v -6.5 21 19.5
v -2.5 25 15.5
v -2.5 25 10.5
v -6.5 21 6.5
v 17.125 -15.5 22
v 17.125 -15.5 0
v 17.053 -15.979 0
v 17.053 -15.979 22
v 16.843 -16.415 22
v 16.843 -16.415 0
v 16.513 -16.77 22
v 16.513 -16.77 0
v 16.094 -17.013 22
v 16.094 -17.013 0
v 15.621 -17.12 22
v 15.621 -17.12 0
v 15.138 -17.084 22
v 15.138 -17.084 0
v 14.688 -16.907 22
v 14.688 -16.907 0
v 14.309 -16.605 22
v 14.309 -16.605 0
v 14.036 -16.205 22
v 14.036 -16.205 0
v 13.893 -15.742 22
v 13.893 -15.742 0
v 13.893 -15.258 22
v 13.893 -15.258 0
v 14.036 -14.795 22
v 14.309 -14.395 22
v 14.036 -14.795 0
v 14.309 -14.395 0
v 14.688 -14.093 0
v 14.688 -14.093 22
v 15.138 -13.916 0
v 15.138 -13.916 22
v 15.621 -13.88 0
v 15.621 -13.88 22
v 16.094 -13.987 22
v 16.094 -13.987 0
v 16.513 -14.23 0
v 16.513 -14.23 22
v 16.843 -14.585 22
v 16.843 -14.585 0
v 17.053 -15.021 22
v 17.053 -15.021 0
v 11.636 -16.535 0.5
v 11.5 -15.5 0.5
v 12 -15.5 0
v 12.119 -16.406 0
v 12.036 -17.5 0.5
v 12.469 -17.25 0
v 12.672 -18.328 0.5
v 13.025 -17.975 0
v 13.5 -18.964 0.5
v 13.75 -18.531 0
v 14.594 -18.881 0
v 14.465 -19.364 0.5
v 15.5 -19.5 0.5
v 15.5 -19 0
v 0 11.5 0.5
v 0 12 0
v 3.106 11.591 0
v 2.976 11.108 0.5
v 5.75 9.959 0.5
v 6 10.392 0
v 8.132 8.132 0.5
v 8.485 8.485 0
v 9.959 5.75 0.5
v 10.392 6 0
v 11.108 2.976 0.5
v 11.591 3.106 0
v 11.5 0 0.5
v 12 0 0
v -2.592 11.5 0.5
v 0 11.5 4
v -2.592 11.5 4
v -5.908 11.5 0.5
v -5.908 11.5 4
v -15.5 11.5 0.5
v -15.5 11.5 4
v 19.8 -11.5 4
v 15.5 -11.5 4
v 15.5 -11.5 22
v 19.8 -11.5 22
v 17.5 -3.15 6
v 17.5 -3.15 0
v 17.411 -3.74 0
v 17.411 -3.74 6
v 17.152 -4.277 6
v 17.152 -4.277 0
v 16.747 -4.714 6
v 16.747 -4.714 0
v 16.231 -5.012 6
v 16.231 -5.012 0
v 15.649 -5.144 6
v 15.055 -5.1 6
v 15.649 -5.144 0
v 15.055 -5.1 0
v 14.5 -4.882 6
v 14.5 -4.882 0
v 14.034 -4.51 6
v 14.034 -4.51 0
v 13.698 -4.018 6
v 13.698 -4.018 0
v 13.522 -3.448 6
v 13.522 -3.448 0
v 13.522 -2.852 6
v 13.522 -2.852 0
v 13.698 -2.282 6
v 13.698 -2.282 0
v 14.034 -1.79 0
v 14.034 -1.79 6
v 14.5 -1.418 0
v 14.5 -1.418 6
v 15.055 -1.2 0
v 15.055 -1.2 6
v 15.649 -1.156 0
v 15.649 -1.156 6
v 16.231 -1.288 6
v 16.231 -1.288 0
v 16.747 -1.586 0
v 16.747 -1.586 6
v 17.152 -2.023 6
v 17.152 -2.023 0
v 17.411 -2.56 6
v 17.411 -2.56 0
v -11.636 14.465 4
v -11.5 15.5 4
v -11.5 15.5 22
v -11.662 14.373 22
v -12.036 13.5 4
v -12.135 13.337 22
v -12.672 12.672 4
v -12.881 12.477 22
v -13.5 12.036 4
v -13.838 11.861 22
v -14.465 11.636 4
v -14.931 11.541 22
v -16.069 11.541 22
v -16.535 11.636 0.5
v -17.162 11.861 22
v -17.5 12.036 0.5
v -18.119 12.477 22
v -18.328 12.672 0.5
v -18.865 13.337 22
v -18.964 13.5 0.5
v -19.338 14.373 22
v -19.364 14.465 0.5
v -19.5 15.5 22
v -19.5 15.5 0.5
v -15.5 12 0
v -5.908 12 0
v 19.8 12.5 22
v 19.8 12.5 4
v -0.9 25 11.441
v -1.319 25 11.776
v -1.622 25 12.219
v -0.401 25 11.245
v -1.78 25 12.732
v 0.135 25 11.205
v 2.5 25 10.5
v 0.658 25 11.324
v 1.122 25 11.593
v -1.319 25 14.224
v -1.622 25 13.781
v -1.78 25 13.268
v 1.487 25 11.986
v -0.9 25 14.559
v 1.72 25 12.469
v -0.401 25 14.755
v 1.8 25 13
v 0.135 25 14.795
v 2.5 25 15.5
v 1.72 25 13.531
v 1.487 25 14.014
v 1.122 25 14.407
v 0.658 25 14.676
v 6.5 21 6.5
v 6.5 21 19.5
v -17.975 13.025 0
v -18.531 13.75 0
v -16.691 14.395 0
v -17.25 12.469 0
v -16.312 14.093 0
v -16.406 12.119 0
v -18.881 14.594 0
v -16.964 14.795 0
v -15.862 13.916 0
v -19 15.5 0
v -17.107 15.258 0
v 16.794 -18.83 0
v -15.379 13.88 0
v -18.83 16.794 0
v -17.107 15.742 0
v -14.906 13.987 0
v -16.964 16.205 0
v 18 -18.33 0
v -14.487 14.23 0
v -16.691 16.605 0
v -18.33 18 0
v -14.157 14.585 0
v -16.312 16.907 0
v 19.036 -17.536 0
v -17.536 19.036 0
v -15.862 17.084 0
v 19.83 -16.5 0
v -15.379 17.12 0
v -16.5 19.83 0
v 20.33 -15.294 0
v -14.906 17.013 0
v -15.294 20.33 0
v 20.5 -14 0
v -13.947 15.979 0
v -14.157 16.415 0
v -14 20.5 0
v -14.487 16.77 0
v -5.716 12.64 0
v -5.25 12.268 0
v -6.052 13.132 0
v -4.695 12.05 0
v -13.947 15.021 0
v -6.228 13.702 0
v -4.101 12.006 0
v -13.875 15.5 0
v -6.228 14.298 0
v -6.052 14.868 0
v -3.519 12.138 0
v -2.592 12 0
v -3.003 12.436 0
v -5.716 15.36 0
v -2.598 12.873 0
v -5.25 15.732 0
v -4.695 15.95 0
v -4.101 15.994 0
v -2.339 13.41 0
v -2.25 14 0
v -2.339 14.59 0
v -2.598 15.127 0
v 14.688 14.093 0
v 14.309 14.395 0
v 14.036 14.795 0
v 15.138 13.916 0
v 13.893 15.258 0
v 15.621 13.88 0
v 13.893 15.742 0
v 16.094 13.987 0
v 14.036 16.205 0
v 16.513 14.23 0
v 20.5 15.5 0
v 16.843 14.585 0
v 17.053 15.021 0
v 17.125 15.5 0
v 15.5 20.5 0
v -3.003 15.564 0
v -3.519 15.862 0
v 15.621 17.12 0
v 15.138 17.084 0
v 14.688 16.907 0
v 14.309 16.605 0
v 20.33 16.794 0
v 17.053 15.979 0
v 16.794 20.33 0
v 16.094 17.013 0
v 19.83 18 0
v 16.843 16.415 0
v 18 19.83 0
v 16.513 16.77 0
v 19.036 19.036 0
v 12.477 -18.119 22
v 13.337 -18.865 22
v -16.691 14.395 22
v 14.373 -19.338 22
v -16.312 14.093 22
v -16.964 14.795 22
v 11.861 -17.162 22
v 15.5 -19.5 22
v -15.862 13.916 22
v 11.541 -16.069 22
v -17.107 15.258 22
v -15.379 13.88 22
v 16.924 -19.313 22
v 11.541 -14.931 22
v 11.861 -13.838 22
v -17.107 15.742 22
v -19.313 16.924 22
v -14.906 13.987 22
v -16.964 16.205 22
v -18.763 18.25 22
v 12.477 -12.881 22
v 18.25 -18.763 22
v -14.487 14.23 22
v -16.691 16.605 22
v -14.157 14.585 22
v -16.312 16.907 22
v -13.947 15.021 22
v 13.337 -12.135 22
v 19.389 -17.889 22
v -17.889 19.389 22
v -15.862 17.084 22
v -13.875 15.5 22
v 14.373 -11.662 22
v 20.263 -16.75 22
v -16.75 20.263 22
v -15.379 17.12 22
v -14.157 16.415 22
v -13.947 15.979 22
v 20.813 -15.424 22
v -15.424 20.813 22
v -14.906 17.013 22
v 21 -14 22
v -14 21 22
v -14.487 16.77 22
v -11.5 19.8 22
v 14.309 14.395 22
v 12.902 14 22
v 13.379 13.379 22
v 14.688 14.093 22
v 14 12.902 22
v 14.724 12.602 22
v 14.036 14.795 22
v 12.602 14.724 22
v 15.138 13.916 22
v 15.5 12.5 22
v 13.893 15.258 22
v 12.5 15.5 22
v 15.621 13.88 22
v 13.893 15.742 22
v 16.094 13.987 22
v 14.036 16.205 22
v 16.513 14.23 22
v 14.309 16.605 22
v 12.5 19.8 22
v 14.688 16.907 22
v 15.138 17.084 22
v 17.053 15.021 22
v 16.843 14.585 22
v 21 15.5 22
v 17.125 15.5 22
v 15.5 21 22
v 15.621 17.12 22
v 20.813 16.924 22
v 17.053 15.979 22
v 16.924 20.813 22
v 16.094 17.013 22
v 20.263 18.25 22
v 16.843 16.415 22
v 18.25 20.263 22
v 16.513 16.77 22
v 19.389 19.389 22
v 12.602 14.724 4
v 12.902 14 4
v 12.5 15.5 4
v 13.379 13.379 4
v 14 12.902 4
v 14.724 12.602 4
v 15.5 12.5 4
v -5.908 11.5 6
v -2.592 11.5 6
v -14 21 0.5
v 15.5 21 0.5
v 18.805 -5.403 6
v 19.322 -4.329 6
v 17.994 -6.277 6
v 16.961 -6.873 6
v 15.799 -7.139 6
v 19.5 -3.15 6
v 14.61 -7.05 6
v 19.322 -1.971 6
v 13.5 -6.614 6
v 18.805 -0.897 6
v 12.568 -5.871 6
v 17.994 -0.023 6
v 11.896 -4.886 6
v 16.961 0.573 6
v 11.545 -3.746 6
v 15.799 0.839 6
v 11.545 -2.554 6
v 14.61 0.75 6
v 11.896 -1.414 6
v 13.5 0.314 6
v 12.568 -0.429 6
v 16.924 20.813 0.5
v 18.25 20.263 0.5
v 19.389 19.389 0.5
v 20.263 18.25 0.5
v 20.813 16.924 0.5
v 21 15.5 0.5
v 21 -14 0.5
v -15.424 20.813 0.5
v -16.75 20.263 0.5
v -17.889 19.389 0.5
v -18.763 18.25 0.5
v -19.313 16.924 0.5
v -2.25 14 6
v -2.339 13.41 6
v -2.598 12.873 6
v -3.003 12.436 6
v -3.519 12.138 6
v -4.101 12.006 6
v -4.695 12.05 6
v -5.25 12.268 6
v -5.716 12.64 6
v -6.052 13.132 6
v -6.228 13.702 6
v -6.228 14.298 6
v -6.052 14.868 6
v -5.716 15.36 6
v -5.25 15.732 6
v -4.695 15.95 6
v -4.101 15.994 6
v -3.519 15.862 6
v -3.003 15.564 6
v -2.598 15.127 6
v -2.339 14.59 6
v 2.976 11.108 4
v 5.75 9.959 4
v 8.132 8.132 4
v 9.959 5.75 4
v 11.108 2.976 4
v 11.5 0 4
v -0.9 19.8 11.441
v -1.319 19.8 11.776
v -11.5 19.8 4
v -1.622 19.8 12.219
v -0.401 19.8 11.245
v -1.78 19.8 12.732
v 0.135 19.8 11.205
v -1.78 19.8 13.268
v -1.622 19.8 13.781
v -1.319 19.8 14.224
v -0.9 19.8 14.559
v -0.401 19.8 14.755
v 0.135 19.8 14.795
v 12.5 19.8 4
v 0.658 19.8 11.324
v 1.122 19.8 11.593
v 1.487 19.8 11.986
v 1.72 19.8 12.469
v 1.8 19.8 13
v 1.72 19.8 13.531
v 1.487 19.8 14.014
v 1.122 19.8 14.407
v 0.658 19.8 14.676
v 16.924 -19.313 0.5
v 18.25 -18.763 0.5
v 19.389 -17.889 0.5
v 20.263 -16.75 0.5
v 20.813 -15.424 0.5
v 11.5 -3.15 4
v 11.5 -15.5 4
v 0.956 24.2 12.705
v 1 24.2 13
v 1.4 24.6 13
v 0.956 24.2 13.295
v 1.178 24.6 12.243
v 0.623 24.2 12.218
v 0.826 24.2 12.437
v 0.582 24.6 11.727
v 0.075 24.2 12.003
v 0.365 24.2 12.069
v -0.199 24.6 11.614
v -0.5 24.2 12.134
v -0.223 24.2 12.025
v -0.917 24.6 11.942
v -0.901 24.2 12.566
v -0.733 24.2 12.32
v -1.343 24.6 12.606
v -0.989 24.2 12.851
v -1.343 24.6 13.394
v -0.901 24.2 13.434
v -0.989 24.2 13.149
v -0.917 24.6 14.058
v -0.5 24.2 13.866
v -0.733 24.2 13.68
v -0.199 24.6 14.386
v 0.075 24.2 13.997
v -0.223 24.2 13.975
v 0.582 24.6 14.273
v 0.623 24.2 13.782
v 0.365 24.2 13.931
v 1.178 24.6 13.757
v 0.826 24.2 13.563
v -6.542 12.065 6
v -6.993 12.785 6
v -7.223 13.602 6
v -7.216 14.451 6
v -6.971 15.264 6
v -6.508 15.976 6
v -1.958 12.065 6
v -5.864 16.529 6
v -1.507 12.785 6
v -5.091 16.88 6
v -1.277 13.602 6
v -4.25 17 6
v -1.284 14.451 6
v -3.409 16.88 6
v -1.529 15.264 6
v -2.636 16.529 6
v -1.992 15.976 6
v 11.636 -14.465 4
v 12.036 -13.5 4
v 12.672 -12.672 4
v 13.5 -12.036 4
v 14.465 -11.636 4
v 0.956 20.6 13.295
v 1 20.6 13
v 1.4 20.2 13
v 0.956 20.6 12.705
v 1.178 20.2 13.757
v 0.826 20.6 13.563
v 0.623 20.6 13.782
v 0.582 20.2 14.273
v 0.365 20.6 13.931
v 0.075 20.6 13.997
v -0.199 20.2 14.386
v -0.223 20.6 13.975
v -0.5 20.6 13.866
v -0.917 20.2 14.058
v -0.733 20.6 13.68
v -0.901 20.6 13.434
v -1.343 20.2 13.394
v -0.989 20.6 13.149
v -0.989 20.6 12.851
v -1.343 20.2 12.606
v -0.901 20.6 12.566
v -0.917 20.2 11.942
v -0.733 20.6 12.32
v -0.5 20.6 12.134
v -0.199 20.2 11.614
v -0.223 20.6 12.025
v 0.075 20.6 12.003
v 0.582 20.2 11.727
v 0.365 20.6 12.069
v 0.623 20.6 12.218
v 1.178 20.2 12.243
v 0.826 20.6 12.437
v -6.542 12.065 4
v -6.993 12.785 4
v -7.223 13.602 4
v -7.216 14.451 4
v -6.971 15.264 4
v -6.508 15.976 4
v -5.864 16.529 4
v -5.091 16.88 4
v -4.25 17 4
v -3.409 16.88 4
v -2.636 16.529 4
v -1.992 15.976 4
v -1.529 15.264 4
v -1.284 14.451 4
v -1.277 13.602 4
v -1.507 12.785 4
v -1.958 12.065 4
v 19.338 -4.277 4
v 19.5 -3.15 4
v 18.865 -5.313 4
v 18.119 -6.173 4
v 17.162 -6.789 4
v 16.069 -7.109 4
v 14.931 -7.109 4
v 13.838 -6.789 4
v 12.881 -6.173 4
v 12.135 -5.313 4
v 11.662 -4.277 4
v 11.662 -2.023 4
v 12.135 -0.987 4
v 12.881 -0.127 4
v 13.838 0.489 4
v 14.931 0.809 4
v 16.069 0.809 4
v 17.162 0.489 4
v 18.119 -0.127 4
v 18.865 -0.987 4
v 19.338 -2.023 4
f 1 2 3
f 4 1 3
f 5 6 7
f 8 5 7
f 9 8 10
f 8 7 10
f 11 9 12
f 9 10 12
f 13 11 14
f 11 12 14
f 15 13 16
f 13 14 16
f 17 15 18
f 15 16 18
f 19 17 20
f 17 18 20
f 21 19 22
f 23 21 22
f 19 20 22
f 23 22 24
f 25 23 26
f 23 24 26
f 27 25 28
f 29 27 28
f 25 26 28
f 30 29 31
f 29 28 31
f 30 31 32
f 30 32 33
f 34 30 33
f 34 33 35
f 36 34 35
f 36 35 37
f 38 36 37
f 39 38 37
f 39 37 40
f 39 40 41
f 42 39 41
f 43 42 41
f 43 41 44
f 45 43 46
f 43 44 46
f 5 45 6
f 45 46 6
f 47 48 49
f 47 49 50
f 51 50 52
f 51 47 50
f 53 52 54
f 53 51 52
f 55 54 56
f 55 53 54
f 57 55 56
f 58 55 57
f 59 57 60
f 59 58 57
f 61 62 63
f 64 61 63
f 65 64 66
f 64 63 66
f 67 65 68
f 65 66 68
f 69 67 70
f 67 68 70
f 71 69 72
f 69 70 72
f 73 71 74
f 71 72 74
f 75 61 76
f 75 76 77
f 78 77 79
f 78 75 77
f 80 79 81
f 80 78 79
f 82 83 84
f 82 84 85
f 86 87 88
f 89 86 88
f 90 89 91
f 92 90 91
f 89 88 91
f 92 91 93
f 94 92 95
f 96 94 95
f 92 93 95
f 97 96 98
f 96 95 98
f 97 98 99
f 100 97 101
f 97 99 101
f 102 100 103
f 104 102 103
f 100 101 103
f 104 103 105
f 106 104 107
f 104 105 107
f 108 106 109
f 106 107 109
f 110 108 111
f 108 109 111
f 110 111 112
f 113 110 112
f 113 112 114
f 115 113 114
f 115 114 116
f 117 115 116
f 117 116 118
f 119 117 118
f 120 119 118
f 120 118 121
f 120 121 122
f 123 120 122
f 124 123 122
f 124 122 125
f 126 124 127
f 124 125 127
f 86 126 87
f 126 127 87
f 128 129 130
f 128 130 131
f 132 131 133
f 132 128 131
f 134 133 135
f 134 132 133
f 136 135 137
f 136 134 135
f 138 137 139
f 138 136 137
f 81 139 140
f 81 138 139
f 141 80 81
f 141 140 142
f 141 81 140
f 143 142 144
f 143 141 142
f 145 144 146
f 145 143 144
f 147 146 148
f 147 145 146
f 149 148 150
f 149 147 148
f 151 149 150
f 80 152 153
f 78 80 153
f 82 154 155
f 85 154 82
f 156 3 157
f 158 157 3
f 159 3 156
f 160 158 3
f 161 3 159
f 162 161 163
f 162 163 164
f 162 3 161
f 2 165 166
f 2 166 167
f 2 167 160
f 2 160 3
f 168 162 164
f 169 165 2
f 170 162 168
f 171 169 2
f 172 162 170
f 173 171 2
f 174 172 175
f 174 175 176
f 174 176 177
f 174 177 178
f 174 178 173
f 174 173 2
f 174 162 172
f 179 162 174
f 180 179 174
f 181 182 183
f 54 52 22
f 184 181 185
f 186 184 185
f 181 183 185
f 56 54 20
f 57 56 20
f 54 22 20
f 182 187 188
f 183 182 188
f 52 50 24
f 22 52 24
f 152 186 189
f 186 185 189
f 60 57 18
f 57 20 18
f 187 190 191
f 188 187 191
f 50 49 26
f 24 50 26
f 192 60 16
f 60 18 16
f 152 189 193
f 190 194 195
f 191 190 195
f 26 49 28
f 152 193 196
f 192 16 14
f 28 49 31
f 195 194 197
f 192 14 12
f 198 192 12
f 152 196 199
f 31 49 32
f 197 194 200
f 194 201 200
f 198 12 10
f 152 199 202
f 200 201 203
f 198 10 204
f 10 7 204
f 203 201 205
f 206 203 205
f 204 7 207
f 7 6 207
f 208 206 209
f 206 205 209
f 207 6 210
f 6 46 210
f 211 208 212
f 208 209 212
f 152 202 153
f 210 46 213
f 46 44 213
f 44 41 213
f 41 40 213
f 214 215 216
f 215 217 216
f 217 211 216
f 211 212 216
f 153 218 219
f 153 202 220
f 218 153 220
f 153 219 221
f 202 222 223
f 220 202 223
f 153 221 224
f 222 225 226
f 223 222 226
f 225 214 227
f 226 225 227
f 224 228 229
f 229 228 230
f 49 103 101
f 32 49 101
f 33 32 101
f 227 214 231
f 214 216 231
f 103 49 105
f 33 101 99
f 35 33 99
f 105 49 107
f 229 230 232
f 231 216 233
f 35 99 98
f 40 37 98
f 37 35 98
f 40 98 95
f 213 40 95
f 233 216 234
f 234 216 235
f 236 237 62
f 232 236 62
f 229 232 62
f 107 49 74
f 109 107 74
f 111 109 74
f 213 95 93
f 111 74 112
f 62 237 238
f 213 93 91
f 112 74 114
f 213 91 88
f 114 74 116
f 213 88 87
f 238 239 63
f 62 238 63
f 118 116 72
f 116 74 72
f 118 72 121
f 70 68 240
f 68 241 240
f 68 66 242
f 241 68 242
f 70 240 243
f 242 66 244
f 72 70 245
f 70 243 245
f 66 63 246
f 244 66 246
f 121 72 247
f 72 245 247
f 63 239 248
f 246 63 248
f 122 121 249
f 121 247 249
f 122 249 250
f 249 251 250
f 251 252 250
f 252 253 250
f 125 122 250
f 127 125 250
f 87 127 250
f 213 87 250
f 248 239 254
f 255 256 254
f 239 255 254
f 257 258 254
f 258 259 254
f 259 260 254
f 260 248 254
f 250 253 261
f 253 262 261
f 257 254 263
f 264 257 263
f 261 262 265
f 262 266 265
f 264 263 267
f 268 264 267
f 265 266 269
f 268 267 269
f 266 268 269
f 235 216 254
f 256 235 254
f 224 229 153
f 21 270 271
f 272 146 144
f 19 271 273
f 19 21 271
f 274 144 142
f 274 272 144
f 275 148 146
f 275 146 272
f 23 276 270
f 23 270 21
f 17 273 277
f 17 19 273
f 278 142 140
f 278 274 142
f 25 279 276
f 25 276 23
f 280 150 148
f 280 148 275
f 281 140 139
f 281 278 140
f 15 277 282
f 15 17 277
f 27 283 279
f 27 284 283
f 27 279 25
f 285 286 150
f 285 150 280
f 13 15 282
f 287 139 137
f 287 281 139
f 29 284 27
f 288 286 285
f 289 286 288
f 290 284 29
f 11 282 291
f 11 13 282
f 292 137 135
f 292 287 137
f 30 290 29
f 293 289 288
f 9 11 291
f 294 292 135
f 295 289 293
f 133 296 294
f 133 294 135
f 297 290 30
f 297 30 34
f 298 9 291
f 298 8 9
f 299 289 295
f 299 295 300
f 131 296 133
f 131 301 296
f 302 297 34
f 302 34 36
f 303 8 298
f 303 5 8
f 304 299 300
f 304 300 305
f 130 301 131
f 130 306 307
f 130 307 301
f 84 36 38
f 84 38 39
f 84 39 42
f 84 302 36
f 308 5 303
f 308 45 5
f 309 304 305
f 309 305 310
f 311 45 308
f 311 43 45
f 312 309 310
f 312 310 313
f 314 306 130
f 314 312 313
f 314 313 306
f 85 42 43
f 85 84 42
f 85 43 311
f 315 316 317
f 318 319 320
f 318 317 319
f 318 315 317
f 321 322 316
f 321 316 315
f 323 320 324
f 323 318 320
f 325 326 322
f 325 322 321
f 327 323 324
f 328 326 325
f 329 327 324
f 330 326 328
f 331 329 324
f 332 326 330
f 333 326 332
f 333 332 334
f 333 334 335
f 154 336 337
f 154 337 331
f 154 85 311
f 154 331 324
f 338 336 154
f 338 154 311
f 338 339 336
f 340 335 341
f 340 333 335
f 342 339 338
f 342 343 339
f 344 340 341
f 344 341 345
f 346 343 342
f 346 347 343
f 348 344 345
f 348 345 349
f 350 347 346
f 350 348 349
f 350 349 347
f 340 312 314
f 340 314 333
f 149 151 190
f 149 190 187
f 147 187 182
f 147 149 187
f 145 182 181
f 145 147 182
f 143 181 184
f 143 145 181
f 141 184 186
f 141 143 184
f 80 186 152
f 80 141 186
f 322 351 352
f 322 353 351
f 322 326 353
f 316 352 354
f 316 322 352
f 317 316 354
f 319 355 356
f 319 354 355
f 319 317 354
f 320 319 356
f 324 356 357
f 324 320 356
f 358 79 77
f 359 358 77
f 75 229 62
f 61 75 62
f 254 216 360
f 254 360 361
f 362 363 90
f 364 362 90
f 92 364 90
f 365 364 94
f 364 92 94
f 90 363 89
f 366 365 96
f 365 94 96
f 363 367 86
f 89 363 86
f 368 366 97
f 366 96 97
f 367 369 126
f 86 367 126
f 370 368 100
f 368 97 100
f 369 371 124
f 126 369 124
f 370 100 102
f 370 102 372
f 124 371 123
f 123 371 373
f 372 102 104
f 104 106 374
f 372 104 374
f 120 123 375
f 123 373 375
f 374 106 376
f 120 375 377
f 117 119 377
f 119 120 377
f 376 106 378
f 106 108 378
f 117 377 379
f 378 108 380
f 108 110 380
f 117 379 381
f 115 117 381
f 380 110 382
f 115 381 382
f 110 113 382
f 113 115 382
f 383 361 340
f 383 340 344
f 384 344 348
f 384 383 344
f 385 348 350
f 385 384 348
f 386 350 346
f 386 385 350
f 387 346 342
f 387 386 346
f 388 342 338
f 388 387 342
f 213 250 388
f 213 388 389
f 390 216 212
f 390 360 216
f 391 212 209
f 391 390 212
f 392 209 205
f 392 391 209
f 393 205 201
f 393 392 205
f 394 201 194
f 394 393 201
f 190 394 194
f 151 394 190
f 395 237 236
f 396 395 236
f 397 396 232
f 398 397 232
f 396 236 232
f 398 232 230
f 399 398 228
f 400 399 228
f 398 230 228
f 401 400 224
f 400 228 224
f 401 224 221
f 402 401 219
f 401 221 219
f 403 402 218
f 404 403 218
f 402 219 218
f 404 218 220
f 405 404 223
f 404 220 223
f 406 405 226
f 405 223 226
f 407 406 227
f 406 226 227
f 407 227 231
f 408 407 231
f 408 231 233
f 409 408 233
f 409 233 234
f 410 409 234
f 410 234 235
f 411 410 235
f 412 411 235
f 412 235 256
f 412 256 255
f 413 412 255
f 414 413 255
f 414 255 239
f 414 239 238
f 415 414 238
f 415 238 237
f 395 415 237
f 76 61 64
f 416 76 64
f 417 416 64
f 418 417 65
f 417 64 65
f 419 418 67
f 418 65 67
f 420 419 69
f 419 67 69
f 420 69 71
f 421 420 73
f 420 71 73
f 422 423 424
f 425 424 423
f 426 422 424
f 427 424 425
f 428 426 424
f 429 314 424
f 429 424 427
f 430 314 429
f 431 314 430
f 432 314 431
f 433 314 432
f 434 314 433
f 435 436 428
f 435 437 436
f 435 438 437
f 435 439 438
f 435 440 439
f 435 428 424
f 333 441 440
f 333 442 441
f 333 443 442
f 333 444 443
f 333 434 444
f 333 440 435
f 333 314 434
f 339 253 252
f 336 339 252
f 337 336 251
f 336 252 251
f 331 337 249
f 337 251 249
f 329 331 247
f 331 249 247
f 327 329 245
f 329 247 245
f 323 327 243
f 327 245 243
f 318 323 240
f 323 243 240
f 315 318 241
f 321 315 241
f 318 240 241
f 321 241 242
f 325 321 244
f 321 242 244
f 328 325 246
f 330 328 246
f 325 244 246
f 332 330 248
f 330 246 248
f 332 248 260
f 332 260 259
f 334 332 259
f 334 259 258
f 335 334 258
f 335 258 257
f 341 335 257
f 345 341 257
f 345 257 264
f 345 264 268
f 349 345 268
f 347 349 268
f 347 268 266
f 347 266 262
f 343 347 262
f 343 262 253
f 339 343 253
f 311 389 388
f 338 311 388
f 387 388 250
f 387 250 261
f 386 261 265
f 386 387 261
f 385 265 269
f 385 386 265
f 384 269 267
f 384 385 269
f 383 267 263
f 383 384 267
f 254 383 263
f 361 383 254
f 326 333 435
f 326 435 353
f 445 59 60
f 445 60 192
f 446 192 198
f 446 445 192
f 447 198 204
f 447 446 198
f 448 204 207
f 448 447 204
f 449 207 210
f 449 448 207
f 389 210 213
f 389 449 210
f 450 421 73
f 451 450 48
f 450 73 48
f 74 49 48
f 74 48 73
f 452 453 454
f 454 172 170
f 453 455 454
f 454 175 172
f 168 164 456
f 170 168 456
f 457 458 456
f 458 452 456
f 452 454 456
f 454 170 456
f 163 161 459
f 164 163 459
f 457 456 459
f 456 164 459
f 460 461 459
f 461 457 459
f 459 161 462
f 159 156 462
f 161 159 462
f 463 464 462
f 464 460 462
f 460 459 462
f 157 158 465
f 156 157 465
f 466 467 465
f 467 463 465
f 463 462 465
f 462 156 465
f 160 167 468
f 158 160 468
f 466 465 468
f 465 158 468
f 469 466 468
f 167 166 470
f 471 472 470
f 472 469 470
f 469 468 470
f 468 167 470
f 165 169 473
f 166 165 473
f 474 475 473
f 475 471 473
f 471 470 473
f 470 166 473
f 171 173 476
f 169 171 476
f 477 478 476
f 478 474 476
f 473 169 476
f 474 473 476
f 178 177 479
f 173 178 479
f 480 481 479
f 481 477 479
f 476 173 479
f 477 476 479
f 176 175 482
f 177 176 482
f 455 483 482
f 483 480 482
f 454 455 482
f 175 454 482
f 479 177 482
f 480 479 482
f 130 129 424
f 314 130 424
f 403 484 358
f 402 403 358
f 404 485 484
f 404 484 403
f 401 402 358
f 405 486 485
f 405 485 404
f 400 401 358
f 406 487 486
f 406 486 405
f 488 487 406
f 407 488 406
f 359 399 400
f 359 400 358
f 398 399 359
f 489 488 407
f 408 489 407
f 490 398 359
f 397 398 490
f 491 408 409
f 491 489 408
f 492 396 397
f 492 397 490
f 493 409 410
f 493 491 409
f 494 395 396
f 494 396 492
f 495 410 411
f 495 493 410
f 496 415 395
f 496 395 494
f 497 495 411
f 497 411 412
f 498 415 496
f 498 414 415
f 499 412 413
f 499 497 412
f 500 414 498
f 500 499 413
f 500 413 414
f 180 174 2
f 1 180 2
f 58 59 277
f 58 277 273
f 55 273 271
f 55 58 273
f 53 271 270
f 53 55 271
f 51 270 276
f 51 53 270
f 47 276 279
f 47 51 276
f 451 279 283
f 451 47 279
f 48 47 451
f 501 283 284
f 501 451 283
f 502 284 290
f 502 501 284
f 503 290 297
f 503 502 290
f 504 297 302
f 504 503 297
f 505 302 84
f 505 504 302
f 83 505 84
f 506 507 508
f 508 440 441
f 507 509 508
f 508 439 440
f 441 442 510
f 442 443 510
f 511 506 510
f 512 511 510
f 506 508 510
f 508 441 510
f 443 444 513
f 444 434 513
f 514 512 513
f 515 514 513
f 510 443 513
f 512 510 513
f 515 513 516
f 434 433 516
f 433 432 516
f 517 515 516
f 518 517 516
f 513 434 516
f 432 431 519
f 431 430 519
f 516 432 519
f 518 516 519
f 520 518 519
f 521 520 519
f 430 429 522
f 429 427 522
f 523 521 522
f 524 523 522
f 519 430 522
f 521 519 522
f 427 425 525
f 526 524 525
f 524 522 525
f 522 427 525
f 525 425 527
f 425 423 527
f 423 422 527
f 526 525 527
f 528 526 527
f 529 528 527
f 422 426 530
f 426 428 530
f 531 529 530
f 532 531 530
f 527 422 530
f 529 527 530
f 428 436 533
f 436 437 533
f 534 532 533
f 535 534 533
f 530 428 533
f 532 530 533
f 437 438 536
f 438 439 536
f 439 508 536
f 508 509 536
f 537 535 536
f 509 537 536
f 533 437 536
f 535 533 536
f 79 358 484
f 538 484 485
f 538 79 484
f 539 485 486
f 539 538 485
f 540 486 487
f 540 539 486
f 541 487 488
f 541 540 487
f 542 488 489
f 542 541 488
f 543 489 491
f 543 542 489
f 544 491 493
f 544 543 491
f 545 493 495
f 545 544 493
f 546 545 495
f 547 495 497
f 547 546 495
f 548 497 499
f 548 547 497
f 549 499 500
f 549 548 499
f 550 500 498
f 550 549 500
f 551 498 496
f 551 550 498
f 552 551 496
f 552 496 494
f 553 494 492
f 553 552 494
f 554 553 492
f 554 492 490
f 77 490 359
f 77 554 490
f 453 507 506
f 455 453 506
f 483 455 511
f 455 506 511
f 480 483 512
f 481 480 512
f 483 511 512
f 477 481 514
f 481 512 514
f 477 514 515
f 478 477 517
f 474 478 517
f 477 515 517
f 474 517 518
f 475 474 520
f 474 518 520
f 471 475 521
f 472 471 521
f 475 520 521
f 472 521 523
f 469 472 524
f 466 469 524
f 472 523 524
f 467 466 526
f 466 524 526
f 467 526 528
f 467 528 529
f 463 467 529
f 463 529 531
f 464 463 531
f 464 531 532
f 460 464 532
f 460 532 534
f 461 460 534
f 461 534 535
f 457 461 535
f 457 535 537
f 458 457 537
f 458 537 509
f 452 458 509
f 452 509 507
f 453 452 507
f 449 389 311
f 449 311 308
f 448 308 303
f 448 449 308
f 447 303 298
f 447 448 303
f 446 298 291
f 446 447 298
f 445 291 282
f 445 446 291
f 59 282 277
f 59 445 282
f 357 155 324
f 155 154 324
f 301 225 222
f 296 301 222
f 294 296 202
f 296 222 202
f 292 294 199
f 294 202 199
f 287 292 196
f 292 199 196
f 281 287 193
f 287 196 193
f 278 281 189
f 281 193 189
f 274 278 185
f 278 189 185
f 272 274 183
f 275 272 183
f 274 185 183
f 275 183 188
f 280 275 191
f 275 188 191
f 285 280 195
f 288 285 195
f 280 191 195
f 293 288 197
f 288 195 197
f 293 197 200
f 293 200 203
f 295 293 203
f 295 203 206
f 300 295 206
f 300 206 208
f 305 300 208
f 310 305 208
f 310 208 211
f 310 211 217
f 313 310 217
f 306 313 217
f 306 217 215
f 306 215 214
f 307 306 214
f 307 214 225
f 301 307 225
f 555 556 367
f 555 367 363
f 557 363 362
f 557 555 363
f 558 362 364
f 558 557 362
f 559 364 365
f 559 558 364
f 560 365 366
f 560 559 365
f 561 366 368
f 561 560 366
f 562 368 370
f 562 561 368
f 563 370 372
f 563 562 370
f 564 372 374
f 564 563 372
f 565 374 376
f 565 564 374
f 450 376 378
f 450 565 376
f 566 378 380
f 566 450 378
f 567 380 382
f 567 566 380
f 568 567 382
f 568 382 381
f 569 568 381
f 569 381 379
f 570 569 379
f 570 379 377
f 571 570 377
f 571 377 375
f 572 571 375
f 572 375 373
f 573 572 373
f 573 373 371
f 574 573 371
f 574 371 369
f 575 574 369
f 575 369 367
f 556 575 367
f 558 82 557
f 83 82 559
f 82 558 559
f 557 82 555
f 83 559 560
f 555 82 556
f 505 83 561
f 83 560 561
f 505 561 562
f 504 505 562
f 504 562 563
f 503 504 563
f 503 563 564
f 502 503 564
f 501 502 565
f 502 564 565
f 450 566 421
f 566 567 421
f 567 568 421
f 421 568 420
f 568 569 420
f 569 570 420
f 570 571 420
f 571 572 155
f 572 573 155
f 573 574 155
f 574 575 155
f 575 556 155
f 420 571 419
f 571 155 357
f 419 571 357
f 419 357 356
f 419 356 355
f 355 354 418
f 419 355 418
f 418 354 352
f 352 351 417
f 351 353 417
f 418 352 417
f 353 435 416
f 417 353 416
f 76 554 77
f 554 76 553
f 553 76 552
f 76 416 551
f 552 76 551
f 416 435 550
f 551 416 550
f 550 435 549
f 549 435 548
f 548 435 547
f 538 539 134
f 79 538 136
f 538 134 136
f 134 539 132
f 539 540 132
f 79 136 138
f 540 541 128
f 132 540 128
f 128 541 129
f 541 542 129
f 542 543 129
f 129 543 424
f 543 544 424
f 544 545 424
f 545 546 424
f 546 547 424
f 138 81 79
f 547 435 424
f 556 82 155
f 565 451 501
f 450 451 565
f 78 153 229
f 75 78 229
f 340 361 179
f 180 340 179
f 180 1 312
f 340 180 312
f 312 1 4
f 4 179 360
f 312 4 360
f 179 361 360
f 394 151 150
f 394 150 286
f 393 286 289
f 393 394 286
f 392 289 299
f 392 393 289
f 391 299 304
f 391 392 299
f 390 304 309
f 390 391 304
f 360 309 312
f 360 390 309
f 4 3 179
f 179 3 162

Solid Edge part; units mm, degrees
sketch "Sketch1" plane through (0, 0, 0) normal (0, 0, 1) x (1, 0, 0)
  line L0 (11.5, 0) -> (11.5, -15.5)
  arc A0 (11.5, -15.5) -> (15.5, -19.5) centre (15.5, -15.5) ccw
  arc A1 (15.5, -19.5) -> (21, -14) centre (15.5, -14) ccw
  line L1 (21, -14) -> (21, 15.5)
  arc A2 (21, 15.5) -> (15.5, 21) centre (15.5, 15.5) ccw
  line L2 (15.5, 21) -> (-14, 21)
  arc A3 (-19.5, 15.5) -> (-14, 21) centre (-14, 15.5) cw
  arc A4 (-15.5, 11.5) -> (-19.5, 15.5) centre (-15.5, 15.5) cw
  line L3 (0, 11.5) -> (-15.5, 11.5)
  arc A5 (0, 11.5) -> (11.5, 0) centre (0, 0) cw
extrude "Protrusion1" add sketch "Sketch1" along normal blind 22
sketch "Sketch2" plane through (0.75, 0.75, 22) normal (0, 0, 1) x (1, 0, 0)
  line L0 (-0.75, 10.75) -> (-16.25, 10.75)
  arc A0 (-16.25, 10.75) -> (-12.25, 14.75) centre (-16.25, 14.75) ccw
  line L1 (-12.25, 14.75) -> (-12.25, 19.05)
  line L2 (-12.25, 19.05) -> (11.75, 19.05)
  line L3 (11.75, 19.05) -> (11.75, 14.75)
  arc A1 (14.75, 11.75) -> (11.75, 14.75) centre (14.75, 14.75) cw
  line L4 (19.05, 11.75) -> (14.75, 11.75)
  line L5 (19.05, 11.75) -> (19.05, -12.25)
  line L6 (14.75, -12.25) -> (19.05, -12.25)
  arc A2 (10.75, -16.25) -> (14.75, -12.25) centre (14.75, -16.25) cw
  line L7 (10.75, -0.75) -> (10.75, -16.25)
  arc A3 (-0.75, 10.75) -> (10.75, -0.75) centre (-0.75, -0.75) cw
extrude "VaciadoExtruido_1" cut sketch "Sketch2" against normal blind 18
sketch "Sketch3" plane through (0, 0, 0) normal (0, 0, 1) x (1, 0, 0)
  circle A0 centre (-15.5, 15.5) radius 1.625
  circle A1 centre (15.5, 15.5) radius 1.625
  circle A2 centre (15.5, -15.5) radius 1.625
  dimension "D1" = 31
  dimension "D2" = 31
  dimension "D3" = 11.5
  dimension "D4" = 3.25
  dimension "D5" = 3.25
  dimension "D6" = 3.25
  dimension "D7" = 4
  dimension "D8" = 4
  dimension "D9" = 5.5
  dimension "D10" = 5.5
  dimension "D11" = 5.5
  dimension "D12" = 4.25
  dimension "D13" = 14
  dimension "D14" = 3.15
extrude "Cutout1" cut sketch "Sketch3" along normal through all
sketch "Sketch4" plane through (0.75, 21, 10.5) normal (0, 1, 0) x (-1, 0, 0)
  line L0 (-1.75, 0) -> (3.25, 0)
  line L1 (3.25, 0) -> (3.25, 5)
  line L2 (3.25, 5) -> (-1.75, 5)
  line L3 (-1.75, 5) -> (-1.75, 0)
extrude "ProtrusiónExtruida_2" add sketch "Sketch4" along normal blind 4
chamfer "Chaflán_1" distance 4 angle 45 4 edges at (-2.5, 21, 13) (0, 21, 15.5) (0, 21, 10.5) (2.5, 21, 13)
sketch "Sketch5" plane through (0.5, 19.8, 12) normal (0, -1, 0) x (1, 0, 0)
  circle A0 centre (-0.5, 1) radius 1
extrude "Cutout2" cut sketch "Sketch5" against normal through all
chamfer "Chaflán_2" distance 0.8 angle 45 2 edges at (0, 25, 12) (-1, 19.8, 13)
sketch "Sketch6" plane through (0.75, 0.75, 0) normal (0, 0, -1) x (1, 0, 0)
  line L0 (-6.6583, -10.75) -> (-3.3417, -10.75)
  arc A0 (-3.3417, -10.75) -> (-6.6583, -10.75) centre (-5, -13.25) cw
  circle A1 centre (14.75, 3.9) radius 4
extrude "Protrusion2" add sketch "Sketch6" against normal blind 6
sketch "Sketch7" plane through (0.75, 0.75, 0) normal (0, 0, -1) x (1, 0, 0)
  circle A0 centre (-5, -13.25) radius 2
  circle A1 centre (14.75, 3.9) radius 2
  dimension "D1" = 4
  dimension "D2" = 4
  dimension "D3" = 6
  dimension "D4" = 8
extrude "Cutout3" cut sketch "Sketch7" against normal through all
chamfer "Chaflán_4" distance 0.5 angle 45 10 edges at (8.1317, 8.1317, 0) (11.5, -7.75, 0) (12.6716, -18.3284, 0) (19.3891, -17.8891, 0) (21, 0.75, 0) (19.3891, 19.3891, 0) (0.75, 21, 0) (-17.8891, 19.3891, 0) (-18.3284, 12.6716, 0) (-7.75, 11.5, 0)
